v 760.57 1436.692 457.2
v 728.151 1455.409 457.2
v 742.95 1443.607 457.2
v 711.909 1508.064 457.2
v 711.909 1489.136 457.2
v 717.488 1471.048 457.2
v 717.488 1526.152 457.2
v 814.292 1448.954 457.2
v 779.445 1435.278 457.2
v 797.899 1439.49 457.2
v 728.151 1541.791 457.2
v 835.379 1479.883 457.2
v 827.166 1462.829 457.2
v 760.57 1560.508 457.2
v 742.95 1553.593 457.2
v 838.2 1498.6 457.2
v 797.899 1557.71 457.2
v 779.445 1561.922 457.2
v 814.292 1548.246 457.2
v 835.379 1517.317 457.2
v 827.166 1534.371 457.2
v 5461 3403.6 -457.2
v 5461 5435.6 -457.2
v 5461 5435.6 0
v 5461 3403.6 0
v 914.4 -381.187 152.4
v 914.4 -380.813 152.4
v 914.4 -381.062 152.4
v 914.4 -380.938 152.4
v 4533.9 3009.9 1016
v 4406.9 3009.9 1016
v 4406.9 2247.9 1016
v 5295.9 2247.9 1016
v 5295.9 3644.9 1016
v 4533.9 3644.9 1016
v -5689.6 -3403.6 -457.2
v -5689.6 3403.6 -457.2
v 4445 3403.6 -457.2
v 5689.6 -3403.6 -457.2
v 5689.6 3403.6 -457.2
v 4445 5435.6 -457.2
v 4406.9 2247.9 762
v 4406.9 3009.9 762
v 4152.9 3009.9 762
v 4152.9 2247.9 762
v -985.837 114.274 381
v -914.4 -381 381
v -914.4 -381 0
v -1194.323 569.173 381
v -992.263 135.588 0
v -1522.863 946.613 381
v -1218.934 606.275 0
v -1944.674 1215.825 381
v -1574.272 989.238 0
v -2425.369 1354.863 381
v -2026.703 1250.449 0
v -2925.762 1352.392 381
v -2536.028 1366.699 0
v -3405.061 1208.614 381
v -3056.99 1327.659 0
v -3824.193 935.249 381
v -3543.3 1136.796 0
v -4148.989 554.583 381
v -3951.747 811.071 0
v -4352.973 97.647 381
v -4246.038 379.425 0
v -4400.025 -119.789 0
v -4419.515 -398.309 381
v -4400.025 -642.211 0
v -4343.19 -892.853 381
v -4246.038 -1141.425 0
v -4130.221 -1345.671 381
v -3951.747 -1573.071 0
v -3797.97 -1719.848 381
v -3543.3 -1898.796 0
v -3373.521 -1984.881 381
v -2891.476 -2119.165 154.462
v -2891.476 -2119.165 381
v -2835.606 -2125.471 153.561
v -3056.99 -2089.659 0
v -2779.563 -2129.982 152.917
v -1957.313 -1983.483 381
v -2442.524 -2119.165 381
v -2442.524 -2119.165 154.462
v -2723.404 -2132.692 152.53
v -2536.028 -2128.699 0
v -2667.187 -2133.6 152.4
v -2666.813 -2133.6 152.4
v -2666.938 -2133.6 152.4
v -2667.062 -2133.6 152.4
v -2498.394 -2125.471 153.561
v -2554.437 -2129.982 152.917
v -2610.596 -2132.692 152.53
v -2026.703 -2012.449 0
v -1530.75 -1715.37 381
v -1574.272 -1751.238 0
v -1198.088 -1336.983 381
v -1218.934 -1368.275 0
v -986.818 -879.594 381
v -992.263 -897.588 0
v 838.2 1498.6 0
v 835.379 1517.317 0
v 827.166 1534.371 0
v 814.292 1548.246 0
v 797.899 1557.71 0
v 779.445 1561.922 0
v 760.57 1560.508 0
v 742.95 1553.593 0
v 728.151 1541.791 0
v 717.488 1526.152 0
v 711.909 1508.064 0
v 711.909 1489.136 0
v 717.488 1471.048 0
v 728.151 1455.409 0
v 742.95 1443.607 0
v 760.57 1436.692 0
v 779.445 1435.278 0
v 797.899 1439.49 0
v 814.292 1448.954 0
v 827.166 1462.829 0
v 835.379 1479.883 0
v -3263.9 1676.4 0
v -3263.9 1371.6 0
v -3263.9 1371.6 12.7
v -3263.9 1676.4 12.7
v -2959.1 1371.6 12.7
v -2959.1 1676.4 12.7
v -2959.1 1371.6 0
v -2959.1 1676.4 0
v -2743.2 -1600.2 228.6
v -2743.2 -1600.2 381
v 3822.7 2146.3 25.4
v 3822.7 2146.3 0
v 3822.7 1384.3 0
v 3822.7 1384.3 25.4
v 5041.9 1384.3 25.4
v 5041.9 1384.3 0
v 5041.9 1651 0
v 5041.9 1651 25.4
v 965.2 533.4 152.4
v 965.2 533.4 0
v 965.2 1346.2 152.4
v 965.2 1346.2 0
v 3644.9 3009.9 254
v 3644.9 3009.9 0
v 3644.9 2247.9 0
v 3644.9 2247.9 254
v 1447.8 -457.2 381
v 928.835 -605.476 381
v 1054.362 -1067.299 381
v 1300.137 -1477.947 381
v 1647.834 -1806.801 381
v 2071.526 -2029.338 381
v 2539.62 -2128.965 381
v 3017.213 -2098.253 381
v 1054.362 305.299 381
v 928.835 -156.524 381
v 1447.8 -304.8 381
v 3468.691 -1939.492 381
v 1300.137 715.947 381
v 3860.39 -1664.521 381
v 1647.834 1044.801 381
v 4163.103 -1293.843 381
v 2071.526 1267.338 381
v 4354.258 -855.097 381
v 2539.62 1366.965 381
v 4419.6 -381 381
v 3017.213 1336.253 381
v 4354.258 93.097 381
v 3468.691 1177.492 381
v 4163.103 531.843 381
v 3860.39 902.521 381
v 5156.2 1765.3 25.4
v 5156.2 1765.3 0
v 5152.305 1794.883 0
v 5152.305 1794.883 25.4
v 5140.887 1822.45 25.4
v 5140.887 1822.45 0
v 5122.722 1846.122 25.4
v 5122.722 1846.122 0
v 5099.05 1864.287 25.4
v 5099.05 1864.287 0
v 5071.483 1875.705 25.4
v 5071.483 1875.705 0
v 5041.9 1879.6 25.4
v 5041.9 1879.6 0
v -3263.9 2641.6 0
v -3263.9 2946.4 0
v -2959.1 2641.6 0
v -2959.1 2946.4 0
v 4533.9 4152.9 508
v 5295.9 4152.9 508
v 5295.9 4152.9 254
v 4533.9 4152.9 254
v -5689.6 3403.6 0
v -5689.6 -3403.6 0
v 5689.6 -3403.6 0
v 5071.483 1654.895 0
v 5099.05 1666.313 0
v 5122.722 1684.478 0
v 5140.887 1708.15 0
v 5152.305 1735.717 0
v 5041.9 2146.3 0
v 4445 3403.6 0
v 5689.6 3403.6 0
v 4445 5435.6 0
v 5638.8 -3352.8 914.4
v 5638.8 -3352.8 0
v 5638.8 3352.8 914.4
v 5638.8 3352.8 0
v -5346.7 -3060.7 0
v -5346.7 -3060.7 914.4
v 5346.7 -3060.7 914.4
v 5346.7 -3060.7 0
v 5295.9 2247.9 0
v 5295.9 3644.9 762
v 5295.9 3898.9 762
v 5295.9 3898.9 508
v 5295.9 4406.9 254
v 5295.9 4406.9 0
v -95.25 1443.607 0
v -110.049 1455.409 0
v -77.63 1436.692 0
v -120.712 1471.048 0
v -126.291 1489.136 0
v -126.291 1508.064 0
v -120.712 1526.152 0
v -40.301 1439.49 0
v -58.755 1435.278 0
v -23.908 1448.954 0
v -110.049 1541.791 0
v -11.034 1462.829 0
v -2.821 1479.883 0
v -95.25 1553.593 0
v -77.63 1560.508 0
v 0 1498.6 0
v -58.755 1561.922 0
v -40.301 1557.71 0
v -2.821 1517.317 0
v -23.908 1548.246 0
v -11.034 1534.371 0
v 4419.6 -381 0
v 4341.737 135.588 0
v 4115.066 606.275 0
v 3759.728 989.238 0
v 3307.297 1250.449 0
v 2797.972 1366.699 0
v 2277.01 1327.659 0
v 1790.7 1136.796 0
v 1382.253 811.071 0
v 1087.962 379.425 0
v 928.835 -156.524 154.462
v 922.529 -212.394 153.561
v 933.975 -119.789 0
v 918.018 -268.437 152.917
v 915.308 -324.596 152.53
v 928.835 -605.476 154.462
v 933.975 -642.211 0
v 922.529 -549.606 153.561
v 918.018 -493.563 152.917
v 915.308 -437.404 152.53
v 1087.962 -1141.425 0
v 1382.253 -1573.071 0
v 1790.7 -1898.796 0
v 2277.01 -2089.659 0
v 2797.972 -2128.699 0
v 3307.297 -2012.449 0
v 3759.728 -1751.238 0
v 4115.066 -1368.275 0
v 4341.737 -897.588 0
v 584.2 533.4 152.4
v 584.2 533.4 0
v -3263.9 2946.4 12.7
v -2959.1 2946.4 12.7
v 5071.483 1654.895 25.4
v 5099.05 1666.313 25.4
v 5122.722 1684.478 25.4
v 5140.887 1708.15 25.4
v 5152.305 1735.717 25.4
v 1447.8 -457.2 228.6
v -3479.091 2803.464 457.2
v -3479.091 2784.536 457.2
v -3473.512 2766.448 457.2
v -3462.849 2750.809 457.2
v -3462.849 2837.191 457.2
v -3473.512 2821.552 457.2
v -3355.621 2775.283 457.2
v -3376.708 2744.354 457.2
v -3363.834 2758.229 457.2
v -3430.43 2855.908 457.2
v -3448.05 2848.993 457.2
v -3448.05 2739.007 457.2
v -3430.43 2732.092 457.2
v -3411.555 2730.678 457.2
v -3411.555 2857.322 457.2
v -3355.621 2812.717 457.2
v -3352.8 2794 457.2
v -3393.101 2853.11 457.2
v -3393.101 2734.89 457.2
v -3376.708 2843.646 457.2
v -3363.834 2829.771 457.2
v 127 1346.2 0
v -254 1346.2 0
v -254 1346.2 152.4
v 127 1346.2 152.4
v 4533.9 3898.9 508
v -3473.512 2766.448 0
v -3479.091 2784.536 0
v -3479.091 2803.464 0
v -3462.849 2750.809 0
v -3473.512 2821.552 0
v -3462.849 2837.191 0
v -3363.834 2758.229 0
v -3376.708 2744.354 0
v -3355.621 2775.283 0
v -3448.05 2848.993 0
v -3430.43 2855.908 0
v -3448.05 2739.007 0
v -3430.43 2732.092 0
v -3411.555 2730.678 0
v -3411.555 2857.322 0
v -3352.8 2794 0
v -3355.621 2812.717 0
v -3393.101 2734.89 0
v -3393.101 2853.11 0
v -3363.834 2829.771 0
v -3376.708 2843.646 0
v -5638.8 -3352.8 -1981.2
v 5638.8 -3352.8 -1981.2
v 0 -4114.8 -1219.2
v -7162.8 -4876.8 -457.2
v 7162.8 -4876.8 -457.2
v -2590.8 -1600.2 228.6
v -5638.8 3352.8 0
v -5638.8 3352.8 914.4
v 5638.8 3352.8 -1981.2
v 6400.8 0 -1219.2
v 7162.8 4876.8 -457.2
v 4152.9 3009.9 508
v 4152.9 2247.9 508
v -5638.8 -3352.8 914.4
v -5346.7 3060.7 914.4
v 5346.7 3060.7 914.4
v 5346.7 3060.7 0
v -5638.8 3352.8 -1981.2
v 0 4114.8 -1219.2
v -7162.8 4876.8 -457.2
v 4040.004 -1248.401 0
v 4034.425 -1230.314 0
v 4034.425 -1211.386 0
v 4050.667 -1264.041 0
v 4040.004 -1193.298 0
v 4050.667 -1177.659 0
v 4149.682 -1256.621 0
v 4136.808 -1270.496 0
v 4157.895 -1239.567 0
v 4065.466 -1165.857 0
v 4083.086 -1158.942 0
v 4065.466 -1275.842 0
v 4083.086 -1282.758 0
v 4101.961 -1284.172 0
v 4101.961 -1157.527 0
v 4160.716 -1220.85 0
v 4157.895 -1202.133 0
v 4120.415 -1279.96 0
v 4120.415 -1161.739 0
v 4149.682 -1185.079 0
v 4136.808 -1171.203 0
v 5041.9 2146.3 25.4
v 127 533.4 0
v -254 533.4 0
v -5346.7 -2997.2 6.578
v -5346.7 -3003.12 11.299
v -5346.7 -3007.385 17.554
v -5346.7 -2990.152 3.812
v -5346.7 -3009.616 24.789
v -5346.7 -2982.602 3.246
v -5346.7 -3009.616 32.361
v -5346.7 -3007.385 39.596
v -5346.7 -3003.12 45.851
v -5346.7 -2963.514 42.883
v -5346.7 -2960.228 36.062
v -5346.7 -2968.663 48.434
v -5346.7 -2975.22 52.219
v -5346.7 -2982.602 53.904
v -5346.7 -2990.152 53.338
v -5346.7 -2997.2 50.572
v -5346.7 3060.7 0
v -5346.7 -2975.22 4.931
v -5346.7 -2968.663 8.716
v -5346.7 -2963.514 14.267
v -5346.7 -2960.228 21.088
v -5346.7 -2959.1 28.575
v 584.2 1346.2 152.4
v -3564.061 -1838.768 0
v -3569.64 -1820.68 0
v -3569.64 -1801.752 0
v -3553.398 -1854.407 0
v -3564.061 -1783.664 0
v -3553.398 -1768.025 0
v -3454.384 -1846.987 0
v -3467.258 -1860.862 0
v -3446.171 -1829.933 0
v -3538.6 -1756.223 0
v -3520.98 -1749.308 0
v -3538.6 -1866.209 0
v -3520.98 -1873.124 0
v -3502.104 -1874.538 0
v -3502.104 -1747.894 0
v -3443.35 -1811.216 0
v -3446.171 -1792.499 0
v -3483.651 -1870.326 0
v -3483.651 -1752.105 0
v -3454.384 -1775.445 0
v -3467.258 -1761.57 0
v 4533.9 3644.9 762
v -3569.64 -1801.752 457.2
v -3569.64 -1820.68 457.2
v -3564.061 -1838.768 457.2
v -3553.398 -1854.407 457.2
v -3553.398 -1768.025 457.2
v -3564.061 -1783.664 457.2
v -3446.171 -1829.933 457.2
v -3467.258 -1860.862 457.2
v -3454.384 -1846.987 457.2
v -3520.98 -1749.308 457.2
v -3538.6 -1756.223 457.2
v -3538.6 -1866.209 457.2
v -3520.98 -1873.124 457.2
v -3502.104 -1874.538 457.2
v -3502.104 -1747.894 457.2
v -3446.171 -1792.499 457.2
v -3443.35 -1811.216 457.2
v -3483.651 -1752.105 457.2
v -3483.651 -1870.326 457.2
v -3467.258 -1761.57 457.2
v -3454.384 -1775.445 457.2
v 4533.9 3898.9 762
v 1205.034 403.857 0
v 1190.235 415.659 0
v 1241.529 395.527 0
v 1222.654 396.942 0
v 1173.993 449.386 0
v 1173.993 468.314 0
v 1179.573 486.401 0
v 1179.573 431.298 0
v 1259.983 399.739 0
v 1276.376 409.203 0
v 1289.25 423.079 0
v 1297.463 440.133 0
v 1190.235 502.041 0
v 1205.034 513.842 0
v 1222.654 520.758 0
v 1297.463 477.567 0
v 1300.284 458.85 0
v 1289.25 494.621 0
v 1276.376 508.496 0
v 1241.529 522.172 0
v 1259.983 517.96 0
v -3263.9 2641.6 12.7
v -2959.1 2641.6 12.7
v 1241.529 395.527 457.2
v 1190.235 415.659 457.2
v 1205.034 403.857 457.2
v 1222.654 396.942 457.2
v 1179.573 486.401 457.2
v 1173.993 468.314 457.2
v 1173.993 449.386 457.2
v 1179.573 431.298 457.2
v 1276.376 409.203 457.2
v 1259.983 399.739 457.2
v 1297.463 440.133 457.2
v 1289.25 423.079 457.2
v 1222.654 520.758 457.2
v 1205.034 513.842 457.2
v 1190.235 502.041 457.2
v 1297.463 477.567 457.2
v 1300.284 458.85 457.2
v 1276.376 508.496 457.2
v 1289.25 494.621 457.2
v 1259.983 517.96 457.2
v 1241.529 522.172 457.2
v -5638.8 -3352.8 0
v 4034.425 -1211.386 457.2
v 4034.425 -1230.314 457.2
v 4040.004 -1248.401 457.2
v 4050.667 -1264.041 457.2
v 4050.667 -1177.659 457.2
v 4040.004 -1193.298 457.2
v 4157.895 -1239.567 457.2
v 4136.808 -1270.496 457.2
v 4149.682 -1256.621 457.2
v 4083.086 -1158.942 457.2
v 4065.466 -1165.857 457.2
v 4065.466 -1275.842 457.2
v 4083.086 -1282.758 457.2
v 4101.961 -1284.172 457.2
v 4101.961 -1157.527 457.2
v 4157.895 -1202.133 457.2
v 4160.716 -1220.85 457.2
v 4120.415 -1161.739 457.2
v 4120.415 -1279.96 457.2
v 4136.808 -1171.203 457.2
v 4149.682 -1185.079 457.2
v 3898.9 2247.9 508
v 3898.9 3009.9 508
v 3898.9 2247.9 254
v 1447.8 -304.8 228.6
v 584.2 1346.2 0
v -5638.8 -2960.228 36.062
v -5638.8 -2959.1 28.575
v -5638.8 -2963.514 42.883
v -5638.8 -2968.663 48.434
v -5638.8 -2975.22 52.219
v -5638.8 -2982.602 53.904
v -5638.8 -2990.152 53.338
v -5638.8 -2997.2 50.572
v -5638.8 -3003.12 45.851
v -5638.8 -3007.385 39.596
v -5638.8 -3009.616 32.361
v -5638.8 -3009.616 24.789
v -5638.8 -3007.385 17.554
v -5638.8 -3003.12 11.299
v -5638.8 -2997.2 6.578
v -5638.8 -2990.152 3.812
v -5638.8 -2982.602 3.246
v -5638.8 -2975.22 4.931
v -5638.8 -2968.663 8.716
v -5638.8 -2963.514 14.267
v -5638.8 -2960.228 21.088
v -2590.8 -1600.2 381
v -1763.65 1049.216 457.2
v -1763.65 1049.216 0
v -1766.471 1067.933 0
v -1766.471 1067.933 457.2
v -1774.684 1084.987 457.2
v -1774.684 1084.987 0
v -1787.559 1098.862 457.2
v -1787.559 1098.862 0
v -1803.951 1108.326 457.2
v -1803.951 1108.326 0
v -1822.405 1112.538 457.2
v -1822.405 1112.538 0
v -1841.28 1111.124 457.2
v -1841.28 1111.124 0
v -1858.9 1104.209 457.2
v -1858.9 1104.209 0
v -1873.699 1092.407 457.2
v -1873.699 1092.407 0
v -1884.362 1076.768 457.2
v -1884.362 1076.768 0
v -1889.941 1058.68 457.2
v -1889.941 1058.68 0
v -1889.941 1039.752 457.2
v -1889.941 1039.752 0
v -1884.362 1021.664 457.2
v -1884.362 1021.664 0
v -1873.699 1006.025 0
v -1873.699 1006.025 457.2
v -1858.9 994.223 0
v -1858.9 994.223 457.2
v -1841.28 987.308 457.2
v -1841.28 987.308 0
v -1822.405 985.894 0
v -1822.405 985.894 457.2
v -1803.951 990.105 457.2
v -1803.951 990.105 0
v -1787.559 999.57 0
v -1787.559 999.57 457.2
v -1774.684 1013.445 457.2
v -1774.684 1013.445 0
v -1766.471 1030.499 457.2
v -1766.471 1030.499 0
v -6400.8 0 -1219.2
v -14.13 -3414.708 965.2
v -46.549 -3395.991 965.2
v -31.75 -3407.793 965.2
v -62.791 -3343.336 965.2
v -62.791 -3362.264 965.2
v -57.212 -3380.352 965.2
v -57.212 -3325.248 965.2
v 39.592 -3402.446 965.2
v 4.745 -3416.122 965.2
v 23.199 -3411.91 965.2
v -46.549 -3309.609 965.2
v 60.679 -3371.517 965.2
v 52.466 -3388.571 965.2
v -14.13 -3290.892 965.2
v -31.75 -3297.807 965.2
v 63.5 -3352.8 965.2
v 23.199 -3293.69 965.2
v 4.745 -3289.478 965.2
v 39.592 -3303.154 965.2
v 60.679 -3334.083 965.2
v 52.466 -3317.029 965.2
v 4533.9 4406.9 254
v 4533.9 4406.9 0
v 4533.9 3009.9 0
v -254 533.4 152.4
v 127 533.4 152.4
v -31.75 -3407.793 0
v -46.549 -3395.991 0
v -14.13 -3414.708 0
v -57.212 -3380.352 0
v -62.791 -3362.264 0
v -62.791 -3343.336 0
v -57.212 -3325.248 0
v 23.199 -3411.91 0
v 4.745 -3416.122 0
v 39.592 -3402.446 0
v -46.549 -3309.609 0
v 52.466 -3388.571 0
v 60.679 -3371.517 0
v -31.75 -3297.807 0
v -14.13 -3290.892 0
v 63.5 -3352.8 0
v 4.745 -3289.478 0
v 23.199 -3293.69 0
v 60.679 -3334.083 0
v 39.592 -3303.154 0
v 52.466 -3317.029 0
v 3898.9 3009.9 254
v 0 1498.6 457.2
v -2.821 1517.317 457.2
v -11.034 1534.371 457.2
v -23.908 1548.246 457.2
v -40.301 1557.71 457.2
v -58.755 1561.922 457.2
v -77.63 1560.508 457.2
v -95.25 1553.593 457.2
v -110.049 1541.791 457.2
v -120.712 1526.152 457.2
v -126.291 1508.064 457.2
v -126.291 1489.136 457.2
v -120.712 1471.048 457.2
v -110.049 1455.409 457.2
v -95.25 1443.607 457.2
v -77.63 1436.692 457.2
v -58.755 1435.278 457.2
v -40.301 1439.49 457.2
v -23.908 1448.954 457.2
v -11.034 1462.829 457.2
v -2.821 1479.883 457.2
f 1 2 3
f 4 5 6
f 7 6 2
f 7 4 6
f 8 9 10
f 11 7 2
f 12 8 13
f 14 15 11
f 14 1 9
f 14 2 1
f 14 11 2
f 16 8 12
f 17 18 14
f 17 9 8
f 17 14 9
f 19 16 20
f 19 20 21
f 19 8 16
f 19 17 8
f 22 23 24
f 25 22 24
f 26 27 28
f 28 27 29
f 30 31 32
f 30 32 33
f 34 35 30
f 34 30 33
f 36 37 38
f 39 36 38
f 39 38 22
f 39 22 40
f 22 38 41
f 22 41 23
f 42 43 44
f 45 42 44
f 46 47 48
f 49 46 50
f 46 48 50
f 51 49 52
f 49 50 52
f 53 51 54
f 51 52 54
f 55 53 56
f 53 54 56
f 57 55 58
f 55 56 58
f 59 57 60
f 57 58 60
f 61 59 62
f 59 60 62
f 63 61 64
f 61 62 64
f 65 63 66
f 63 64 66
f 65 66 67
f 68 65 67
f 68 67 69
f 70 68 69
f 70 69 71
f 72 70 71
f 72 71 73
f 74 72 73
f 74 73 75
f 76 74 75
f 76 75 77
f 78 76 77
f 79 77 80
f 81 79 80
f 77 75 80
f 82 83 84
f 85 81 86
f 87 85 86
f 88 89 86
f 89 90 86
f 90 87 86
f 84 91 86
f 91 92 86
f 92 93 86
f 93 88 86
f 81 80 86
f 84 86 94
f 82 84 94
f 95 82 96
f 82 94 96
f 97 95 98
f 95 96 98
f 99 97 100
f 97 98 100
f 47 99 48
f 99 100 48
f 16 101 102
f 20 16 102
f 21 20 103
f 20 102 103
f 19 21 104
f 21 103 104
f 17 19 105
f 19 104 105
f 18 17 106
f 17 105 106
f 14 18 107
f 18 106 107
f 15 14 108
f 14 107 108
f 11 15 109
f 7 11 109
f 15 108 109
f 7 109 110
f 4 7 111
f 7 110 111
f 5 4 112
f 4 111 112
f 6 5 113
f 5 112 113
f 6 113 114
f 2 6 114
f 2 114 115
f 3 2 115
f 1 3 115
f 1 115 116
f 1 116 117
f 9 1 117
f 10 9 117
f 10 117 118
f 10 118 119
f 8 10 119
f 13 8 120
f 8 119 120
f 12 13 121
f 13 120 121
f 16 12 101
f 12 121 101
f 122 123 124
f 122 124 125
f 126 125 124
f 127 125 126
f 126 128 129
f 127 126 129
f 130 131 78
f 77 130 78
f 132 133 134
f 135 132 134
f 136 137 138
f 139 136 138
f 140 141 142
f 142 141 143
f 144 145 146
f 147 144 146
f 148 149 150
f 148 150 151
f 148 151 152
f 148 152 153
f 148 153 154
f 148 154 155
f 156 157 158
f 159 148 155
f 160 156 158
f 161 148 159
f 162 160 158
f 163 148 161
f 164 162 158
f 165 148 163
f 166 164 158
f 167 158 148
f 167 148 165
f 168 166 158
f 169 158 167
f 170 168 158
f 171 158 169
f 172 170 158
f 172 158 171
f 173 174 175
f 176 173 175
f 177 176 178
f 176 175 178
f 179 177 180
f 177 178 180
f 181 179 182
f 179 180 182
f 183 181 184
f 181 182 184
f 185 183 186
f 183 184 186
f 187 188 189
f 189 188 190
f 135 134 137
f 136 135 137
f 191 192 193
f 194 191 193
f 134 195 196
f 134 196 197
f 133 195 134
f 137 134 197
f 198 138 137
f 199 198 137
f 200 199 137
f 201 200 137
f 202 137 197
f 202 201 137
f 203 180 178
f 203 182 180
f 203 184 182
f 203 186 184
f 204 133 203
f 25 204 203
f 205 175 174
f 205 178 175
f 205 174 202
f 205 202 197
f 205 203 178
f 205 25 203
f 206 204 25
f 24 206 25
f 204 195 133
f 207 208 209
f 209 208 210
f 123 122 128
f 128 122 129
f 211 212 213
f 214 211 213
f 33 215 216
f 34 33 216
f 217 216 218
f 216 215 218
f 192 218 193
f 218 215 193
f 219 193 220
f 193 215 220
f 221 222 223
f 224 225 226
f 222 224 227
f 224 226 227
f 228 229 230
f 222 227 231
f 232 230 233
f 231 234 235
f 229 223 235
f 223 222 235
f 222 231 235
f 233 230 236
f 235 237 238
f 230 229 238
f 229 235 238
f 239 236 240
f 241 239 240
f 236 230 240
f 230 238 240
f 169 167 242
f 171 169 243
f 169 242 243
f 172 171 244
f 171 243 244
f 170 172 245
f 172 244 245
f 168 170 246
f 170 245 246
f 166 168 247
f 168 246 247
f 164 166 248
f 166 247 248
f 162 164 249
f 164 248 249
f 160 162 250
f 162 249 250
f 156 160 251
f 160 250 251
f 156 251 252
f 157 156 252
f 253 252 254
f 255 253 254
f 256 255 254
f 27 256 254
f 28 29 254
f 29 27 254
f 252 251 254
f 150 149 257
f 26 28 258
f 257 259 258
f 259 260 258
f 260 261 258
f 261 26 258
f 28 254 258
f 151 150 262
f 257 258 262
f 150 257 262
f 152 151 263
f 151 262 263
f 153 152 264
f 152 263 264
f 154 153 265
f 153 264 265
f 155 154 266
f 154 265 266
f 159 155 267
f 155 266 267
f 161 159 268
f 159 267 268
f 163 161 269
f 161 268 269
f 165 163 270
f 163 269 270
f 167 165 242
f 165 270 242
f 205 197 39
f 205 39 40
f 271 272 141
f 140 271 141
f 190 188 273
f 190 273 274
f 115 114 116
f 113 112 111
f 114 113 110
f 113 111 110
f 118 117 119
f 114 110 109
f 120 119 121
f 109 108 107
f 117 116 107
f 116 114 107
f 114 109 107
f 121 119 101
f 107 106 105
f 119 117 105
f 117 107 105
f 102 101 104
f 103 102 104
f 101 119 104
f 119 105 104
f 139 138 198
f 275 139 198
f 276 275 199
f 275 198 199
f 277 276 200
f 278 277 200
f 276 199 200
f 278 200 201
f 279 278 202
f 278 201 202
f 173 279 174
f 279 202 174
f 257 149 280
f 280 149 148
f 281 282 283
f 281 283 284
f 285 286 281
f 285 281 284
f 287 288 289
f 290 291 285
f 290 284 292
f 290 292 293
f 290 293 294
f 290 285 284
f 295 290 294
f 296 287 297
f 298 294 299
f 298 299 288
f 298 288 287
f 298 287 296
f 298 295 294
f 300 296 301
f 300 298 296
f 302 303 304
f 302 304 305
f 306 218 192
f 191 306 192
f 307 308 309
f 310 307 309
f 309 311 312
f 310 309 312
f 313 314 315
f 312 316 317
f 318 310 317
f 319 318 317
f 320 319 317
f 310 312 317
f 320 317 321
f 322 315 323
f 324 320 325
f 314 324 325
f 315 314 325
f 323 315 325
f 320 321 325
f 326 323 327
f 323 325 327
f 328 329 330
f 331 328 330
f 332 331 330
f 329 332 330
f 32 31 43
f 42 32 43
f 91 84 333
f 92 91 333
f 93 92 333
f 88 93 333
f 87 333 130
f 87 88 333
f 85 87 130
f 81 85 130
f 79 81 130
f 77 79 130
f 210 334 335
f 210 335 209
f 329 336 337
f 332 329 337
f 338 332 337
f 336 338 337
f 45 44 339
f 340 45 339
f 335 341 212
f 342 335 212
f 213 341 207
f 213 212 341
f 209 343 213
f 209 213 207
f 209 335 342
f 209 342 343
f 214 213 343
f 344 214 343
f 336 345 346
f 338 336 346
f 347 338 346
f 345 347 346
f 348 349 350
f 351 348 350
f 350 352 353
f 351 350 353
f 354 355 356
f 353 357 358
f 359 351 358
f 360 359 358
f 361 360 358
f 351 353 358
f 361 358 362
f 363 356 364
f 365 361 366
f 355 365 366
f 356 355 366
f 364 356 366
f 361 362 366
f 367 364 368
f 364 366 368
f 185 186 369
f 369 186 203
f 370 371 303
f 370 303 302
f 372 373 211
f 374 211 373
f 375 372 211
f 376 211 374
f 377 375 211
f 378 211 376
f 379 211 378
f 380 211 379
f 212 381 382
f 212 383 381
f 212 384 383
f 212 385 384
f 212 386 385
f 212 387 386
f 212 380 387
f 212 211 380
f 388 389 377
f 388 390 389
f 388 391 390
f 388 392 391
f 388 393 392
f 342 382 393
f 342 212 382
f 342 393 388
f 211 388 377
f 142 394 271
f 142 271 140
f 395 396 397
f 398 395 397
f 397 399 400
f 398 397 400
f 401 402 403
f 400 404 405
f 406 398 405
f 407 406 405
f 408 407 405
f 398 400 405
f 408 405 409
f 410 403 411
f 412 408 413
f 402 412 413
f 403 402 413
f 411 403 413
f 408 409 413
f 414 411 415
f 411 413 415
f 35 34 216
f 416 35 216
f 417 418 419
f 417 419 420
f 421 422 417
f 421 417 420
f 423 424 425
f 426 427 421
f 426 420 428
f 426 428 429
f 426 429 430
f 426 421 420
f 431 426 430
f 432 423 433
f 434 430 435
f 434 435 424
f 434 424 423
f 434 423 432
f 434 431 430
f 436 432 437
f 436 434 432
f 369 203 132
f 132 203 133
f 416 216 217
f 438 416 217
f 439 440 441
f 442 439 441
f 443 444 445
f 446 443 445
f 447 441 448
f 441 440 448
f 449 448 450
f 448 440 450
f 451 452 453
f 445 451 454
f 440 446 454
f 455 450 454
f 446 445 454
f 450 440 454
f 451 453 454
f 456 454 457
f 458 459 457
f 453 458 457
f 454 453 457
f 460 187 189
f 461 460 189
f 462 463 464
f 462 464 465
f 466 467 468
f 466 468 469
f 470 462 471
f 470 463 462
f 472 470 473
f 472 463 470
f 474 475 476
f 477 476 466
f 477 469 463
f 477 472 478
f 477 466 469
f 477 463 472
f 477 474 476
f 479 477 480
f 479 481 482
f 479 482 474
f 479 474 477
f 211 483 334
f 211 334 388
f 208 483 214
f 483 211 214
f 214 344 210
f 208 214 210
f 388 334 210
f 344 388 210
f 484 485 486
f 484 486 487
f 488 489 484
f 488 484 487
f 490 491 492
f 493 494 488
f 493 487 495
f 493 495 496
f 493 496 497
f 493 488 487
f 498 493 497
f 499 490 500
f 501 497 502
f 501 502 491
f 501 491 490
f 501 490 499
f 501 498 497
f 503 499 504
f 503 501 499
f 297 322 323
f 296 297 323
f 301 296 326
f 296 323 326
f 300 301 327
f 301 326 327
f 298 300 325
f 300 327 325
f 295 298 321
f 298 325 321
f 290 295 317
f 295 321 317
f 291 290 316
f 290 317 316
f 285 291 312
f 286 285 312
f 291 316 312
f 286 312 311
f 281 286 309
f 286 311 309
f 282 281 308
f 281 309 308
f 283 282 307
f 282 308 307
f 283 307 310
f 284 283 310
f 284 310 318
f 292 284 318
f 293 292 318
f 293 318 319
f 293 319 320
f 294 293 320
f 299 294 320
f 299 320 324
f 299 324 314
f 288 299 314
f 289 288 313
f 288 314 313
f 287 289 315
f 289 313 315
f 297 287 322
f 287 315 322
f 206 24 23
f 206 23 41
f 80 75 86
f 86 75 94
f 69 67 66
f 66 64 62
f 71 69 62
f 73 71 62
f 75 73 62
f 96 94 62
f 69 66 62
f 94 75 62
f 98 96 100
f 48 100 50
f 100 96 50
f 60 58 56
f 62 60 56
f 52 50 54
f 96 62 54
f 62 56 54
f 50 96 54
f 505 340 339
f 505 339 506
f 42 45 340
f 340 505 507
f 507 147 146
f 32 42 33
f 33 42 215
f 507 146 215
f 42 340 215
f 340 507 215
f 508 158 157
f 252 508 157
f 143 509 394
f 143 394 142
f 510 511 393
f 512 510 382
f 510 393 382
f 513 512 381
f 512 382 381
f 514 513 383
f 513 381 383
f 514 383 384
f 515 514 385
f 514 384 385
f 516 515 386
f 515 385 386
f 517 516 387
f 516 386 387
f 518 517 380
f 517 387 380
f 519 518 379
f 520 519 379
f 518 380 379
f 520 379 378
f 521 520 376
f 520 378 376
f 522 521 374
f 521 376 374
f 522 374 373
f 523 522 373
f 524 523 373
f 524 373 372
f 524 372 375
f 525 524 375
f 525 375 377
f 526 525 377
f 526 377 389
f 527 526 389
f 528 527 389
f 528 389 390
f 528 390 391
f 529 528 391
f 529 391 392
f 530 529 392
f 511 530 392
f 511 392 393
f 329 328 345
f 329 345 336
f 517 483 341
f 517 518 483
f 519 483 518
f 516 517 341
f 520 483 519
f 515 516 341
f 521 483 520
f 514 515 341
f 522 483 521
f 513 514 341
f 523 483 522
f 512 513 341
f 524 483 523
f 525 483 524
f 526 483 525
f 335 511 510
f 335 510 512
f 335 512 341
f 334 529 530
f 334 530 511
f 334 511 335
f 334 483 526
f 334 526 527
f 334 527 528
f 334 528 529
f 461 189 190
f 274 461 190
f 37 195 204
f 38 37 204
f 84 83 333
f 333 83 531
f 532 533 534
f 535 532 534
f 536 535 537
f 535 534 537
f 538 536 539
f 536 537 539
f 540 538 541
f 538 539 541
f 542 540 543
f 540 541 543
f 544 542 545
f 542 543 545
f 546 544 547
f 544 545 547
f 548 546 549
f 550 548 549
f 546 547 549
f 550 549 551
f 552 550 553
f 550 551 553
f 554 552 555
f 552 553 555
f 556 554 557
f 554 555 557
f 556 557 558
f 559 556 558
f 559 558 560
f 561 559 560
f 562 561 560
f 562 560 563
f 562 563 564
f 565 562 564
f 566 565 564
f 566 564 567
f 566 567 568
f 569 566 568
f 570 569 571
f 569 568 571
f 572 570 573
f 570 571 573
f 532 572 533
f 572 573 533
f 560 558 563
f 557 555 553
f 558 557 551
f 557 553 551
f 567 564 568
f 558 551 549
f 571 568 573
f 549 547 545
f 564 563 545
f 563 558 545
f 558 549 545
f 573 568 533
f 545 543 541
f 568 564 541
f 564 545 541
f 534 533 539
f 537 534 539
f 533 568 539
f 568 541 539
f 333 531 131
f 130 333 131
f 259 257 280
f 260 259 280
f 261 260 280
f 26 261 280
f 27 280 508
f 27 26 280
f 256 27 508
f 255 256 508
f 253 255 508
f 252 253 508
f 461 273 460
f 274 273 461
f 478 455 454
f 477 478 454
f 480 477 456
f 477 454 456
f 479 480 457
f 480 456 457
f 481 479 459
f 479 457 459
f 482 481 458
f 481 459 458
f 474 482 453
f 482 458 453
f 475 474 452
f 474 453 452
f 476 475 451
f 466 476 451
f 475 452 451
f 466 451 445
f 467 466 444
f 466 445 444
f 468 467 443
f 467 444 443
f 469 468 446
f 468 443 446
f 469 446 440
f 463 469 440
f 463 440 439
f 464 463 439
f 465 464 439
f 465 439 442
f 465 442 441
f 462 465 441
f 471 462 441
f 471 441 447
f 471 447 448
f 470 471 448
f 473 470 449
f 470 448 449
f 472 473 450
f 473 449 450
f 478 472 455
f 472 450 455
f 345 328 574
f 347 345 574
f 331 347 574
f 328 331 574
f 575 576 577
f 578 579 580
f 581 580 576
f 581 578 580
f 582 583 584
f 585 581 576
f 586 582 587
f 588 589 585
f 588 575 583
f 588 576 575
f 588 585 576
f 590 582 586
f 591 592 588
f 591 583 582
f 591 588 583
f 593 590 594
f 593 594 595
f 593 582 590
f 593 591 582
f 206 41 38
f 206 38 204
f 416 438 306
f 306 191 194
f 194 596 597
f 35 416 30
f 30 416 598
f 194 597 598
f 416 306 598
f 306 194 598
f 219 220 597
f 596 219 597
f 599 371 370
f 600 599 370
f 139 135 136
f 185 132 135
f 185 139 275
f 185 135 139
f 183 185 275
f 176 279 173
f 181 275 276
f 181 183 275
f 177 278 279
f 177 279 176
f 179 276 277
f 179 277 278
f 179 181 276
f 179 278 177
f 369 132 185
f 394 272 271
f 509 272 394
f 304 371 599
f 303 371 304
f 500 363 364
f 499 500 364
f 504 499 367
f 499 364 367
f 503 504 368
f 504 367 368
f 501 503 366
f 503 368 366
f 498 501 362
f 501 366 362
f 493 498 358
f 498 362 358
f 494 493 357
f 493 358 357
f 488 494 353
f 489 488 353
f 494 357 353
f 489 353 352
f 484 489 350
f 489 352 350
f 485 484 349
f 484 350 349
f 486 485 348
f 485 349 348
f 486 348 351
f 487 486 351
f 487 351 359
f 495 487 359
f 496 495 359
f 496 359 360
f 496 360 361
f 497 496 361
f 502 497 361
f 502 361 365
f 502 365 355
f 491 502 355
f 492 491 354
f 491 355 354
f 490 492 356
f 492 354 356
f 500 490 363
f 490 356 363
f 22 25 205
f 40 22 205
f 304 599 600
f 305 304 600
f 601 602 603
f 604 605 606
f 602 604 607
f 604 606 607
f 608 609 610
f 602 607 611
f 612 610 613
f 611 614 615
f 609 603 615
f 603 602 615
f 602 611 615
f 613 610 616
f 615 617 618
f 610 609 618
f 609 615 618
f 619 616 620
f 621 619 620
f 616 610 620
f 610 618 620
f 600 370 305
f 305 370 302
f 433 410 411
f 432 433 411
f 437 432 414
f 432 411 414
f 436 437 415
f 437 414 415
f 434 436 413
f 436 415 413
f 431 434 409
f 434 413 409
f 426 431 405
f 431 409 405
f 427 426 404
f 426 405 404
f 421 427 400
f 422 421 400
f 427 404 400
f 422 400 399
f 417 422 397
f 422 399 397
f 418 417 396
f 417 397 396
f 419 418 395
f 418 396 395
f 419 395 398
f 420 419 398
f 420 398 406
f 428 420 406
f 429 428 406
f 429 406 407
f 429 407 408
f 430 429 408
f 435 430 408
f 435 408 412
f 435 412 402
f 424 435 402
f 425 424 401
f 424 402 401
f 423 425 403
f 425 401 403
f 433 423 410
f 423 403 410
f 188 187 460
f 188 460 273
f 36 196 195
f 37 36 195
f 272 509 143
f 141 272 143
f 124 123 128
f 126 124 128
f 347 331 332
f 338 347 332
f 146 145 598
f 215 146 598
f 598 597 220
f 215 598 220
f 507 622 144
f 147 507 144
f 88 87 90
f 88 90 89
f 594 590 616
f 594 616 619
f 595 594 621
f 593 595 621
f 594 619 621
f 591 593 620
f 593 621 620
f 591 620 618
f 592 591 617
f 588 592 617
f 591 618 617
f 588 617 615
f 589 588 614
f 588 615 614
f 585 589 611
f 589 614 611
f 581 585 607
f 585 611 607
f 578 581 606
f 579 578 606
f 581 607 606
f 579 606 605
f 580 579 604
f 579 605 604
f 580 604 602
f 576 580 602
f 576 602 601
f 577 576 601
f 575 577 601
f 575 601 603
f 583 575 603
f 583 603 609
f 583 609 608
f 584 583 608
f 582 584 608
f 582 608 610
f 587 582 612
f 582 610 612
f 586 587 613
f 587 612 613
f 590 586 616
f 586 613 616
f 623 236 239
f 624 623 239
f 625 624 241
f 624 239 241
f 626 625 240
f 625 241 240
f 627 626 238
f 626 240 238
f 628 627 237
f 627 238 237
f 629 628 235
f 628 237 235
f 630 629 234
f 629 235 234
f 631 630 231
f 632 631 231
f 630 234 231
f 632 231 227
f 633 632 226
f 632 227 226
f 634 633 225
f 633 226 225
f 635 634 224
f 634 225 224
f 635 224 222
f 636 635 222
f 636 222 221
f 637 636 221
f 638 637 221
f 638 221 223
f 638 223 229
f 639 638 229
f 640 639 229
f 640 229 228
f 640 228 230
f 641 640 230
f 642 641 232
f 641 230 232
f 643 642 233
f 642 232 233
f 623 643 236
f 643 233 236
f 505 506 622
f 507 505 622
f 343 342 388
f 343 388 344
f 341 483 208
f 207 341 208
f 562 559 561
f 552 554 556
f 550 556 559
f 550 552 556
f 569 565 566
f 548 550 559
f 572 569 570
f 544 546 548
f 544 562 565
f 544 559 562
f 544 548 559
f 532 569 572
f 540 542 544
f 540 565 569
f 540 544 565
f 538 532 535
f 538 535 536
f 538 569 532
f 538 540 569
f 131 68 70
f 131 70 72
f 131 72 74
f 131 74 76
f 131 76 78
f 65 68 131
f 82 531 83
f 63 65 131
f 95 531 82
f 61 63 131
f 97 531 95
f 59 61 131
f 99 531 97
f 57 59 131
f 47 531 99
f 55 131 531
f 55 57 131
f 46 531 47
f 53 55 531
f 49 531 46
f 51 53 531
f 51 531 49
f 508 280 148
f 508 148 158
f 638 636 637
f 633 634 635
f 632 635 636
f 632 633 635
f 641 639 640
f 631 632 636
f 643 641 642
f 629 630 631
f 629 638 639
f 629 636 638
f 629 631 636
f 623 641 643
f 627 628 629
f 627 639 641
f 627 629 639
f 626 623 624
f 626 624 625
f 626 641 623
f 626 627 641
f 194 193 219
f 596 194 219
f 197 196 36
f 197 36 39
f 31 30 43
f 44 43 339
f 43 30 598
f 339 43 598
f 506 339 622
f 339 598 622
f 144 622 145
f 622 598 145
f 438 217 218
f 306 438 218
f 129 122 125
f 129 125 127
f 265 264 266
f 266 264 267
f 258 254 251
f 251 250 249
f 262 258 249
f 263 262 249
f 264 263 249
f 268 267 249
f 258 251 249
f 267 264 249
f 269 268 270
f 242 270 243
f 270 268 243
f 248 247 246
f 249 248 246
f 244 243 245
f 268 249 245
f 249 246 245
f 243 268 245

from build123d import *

# Parameters (mm, degrees)
F0_W        = 11277.6
F0_H        = 6705.6
F1_DEPTH    = 457.2
F2_W        = 11277.6
F2_H        = 6705.6
F2_W_2      = 10668
F2_H_2      = 6096
F3_DEPTH    = 914.4
F4_R        = 1752.6
F5_DEPTH    = 381
F6_W        = 304.8
F6_H        = 304.8
F7_DEPTH    = 12.7
F8_W        = 381
F8_H        = 812.8
F9_DEPTH    = 152.4
F11_W       = 11277.6
F11_H       = 6705.6
F12_DEPTH   = 1524
F12_TAPER   = -45
F14_R       = 63.5
F15_DEPTH   = 457.2
F16_DEPTH   = 508
F17_W       = 10693.4
F17_H       = 6121.4
F17_W_2     = 10668
F17_H_2     = 6096
F18_DEPTH   = 914.4
F21_DEPTH   = 228.6
F22_SIZE2   = 533.39999
F22_SIZE    = 76.19999
F22_2_SIZE2 = 533.39999
F22_2_SIZE  = 76.19999
F23_W       = 11379.2
F23_H       = 6807.2
F23_W_2     = 11277.6
F23_H_2     = 6705.6
F24_DEPTH   = 457.2
F25_W       = 1016
F25_H       = 457.2
F26_DEPTH   = 2032
F27_R       = 25.4
F28_DEPTH   = 1816.1010001
F30_DEPTH   = 1016
F32_DEPTH   = 762
F34_DEPTH   = 762
F36_DEPTH   = 25.4


# Not quite as in the source:
# - a fillet or chamfer is up to 0.001 mm smaller than in the source, because OpenCascade refuses the exact size


with BuildPart() as f1:
    # F0 (on Top) → F1 (new body)
    with BuildSketch(Plane.XY):
        Rectangle(F0_W, F0_H)
    extrude(amount=-F1_DEPTH)

    # F23 (on Top) → F24 (join, through all)
    with BuildSketch(Plane.XY):
        Rectangle(F23_W, F23_H)
        Rectangle(F23_W_2, F23_H_2, mode=Mode.SUBTRACT)
    extrude(amount=-F24_DEPTH)

    # F25 (on face) → F26 (join)
    with BuildSketch(Plane(origin=(0, 3403.6, 0), x_dir=(-1, 0, 0), z_dir=(0, 1, 0))):
        with Locations((-4953, -228.6)):
            Rectangle(F25_W, F25_H)
    extrude(amount=F26_DEPTH)

    # F35 (on face) → F36 (join)
    with BuildSketch(Plane.XY):
        with BuildLine():
            Line((5041.9, 2146.3), (3822.7, 2146.3))
            Line((3822.7, 2146.3), (3822.7, 1384.3))
            Line((3822.7, 1384.3), (5041.9, 1384.3))
            Line((5041.9, 1384.3), (5041.9, 1651))
            ThreePointArc((5041.9, 1651), (4927.6, 1765.3), (5041.9, 1879.6))
            Line((5041.9, 1879.6), (5041.9, 2146.3))
        make_face()
        with BuildLine():
            ThreePointArc((5156.2, 1765.3), (5122.7223050896, 1846.1223050896), (5041.9, 1879.6))
            Line((5041.9, 1879.6), (5041.9, 1651))
            ThreePointArc((5041.9, 1651), (5122.7223050896, 1684.4776949104), (5156.2, 1765.3))
        make_face()
        with BuildLine():
            Line((5041.9, 1651), (5041.9, 1879.6))
            ThreePointArc((5041.9, 1879.6), (4927.6, 1765.3), (5041.9, 1651))
        make_face()
    extrude(amount=F36_DEPTH)


with BuildPart() as f3:
    # F2 (on face) → F3 (new body)
    with BuildSketch(Plane.XY):
        Rectangle(F2_W, F2_H)
        Rectangle(F2_W_2, F2_H_2, mode=Mode.SUBTRACT)
    extrude(amount=F3_DEPTH)

    # F17 (on face) → F18 (cut, through all)
    with BuildSketch(Plane.XY.offset(914.4)):
        Rectangle(F17_W, F17_H)
        Rectangle(F17_W_2, F17_H_2, mode=Mode.SUBTRACT)
    extrude(amount=-F18_DEPTH, mode=Mode.SUBTRACT)

    # F27 (on face) → F28 (cut, through all)
    with BuildSketch(Plane.YZ.offset(-5346.7)):
        with Locations((-2984.5, 28.575)):
            Circle(F27_R)
    extrude(amount=-F28_DEPTH, mode=Mode.SUBTRACT)


with BuildPart() as f5:
    # F4 (on face) → F5 (new body)
    with BuildSketch(Plane.XY):
        with Locations((-2667, -381)):
            Circle(F4_R)
    extrude(amount=F5_DEPTH)


with BuildPart() as f5b:
    # F4 (on face) → F5, piece 2 (new body)
    with BuildSketch(Plane.XY):
        with Locations((2667, -381)):
            Circle(F4_R)
    extrude(amount=F5_DEPTH)


with BuildPart() as f7:
    # F6 (on face) → F7 (new body)
    with BuildSketch(Plane.XY):
        with Locations((-3111.5, 2794)):
            Rectangle(F6_W, F6_H)
    extrude(amount=F7_DEPTH)


with BuildPart() as f7b:
    # F6 (on face) → F7, piece 2 (new body)
    with BuildSketch(Plane.XY):
        with Locations((-3111.5, 1524)):
            Rectangle(F6_W, F6_H)
    extrude(amount=F7_DEPTH)


with BuildPart() as f9:
    # F8 (on face) → F9 (new body)
    with BuildSketch(Plane.XY):
        with Locations((-63.5, 939.8)):
            Rectangle(F8_W, F8_H)
    extrude(amount=F9_DEPTH)


with BuildPart() as f9b:
    # F8 (on face) → F9, piece 2 (new body)
    with BuildSketch(Plane.XY):
        with Locations((774.7, 939.8)):
            Rectangle(F8_W, F8_H)
    extrude(amount=F9_DEPTH)


with BuildPart() as f12:
    # F11 (on offset) → F12 (new body)
    with BuildSketch(Plane(origin=(0, 0, -1981.2), x_dir=(1, 0, 0), z_dir=(0, 0, -1))):
        Rectangle(F11_W, F11_H)
    extrude(amount=-F12_DEPTH, taper=F12_TAPER)


with BuildPart() as f15:
    # F14 (on face) → F15 (new body)
    with BuildSketch(Plane.XY):
        with Locations((-63.5, 1498.6)):
            Circle(F14_R)
    extrude(amount=F15_DEPTH)


with BuildPart() as f15b:
    # F14 (on face) → F15, piece 2 (new body)
    with BuildSketch(Plane.XY):
        with Locations((774.7, 1498.6)):
            Circle(F14_R)
    extrude(amount=F15_DEPTH)


with BuildPart() as f15c:
    # F14 (on face) → F15, piece 3 (new body)
    with BuildSketch(Plane.XY):
        with Locations((4097.2159486254, -1220.8497000298)):
            Circle(F14_R)
    extrude(amount=F15_DEPTH)


with BuildPart() as f15d:
    # F14 (on face) → F15, piece 4 (new body)
    with BuildSketch(Plane.XY):
        with Locations((-3416.3, 2794)):
            Circle(F14_R)
    extrude(amount=F15_DEPTH)


with BuildPart() as f15e:
    # F14 (on face) → F15, piece 5 (new body)
    with BuildSketch(Plane.XY):
        with Locations((0, -3352.8)):
            Circle(F14_R)
    extrude(amount=F15_DEPTH)

    # F16 (add): a face of the model
    f16_faces = [f15e.faces().sort_by_distance(p)[0] for p in [
        (0, -3352.8, 457.2),
    ]]
    extrude(f16_faces, amount=F16_DEPTH)


with BuildPart() as f15f:
    # F14 (on face) → F15, piece 6 (new body)
    with BuildSketch(Plane.XY):
        with Locations((1236.7840513746, 458.8497000298)):
            Circle(F14_R)
    extrude(amount=F15_DEPTH)


with BuildPart() as f15g:
    # F14 (on face) → F15, piece 7 (new body)
    with BuildSketch(Plane.XY):
        with Locations((-3506.8497000298, -1811.2159486254)):
            Circle(F14_R)
    extrude(amount=F15_DEPTH)


with BuildPart() as f15h:
    # F14 (on face) → F15, piece 8 (new body)
    with BuildSketch(Plane.XY):
        with Locations((-1827.1502999702, 1049.2159486254)):
            Circle(F14_R)
    extrude(amount=F15_DEPTH)


with BuildPart() as f21_tool:
    # F20 (on face) → F21 (new body)
    with BuildSketch(Plane.XY.offset(381)):
        Polygon((-2743.2, -1600.2), (-2895.6, -2133.6), (-2438.4, -2133.6), (-2590.8, -1600.2), align=None)
        Polygon((1447.8, -304.8), (914.4, -152.4), (914.4, -609.6), (1447.8, -457.2), align=None)
    extrude(amount=-F21_DEPTH)


with BuildPart() as f5_1:
    add(f5.part)

    # F21: cut by f21_tool
    add(f21_tool.part, mode=Mode.SUBTRACT)

    # F22 (size 76.2 and 533.4 in the source; OpenCascade refuses exactly that, so slightly less here)
    f22_edges = [f5_1.edges().sort_by_distance(p)[0] for p in [
        (-2667, -1600.2, 152.4),
    ]]
    chamfer(f22_edges, length=F22_SIZE, length2=F22_SIZE2)


with BuildPart() as f5b_1:
    add(f5b.part)

    # F21: cut by f21_tool
    add(f21_tool.part, mode=Mode.SUBTRACT)

    # F22#2 (size 76.2 and 533.4 in the source; OpenCascade refuses exactly that, so slightly less here)
    f22_2_edges = [f5b_1.edges().sort_by_distance(p)[0] for p in [
        (1447.8, -381, 152.4),
    ]]
    chamfer(f22_2_edges, length=F22_2_SIZE, length2=F22_2_SIZE2)


with BuildPart() as f30:
    # F29 (on face) → F30 (new body)
    with BuildSketch(Plane.XY):
        Polygon((3644.9, 3009.9), (3644.9, 2247.9), (5295.9, 2247.9), (5295.9, 4406.9), (4533.9, 4406.9), (4533.9, 3009.9), align=None)
    extrude(amount=F30_DEPTH)

    # F31 (on face) → F32 (cut)
    with BuildSketch(Plane.YZ.offset(5295.9)):
        Polygon((4152.9, 254), (4406.9, 254), (4406.9, 1016), (3644.9, 1016), (3644.9, 762), (3898.9, 762), (3898.9, 508), (4152.9, 508), align=None)
    extrude(amount=-F32_DEPTH, mode=Mode.SUBTRACT)

    # F33 (on face) → F34 (cut)
    with BuildSketch(Plane(origin=(0, 3009.9, 0), x_dir=(-1, 0, 0), z_dir=(0, 1, 0))):
        Polygon((-3898.9, 254), (-3644.9, 254), (-3644.9, 1016), (-4406.9, 1016), (-4406.9, 762), (-4152.9, 762), (-4152.9, 508), (-3898.9, 508), align=None)
    extrude(amount=-F34_DEPTH, mode=Mode.SUBTRACT)


solid = Compound([f1.part, f3.part, f7.part, f7b.part, f9.part, f9b.part, f12.part, f15.part, f15b.part, f15c.part, f15d.part, f15e.part, f15f.part, f15g.part, f15h.part, f5_1.part, f5b_1.part, f30.part])
